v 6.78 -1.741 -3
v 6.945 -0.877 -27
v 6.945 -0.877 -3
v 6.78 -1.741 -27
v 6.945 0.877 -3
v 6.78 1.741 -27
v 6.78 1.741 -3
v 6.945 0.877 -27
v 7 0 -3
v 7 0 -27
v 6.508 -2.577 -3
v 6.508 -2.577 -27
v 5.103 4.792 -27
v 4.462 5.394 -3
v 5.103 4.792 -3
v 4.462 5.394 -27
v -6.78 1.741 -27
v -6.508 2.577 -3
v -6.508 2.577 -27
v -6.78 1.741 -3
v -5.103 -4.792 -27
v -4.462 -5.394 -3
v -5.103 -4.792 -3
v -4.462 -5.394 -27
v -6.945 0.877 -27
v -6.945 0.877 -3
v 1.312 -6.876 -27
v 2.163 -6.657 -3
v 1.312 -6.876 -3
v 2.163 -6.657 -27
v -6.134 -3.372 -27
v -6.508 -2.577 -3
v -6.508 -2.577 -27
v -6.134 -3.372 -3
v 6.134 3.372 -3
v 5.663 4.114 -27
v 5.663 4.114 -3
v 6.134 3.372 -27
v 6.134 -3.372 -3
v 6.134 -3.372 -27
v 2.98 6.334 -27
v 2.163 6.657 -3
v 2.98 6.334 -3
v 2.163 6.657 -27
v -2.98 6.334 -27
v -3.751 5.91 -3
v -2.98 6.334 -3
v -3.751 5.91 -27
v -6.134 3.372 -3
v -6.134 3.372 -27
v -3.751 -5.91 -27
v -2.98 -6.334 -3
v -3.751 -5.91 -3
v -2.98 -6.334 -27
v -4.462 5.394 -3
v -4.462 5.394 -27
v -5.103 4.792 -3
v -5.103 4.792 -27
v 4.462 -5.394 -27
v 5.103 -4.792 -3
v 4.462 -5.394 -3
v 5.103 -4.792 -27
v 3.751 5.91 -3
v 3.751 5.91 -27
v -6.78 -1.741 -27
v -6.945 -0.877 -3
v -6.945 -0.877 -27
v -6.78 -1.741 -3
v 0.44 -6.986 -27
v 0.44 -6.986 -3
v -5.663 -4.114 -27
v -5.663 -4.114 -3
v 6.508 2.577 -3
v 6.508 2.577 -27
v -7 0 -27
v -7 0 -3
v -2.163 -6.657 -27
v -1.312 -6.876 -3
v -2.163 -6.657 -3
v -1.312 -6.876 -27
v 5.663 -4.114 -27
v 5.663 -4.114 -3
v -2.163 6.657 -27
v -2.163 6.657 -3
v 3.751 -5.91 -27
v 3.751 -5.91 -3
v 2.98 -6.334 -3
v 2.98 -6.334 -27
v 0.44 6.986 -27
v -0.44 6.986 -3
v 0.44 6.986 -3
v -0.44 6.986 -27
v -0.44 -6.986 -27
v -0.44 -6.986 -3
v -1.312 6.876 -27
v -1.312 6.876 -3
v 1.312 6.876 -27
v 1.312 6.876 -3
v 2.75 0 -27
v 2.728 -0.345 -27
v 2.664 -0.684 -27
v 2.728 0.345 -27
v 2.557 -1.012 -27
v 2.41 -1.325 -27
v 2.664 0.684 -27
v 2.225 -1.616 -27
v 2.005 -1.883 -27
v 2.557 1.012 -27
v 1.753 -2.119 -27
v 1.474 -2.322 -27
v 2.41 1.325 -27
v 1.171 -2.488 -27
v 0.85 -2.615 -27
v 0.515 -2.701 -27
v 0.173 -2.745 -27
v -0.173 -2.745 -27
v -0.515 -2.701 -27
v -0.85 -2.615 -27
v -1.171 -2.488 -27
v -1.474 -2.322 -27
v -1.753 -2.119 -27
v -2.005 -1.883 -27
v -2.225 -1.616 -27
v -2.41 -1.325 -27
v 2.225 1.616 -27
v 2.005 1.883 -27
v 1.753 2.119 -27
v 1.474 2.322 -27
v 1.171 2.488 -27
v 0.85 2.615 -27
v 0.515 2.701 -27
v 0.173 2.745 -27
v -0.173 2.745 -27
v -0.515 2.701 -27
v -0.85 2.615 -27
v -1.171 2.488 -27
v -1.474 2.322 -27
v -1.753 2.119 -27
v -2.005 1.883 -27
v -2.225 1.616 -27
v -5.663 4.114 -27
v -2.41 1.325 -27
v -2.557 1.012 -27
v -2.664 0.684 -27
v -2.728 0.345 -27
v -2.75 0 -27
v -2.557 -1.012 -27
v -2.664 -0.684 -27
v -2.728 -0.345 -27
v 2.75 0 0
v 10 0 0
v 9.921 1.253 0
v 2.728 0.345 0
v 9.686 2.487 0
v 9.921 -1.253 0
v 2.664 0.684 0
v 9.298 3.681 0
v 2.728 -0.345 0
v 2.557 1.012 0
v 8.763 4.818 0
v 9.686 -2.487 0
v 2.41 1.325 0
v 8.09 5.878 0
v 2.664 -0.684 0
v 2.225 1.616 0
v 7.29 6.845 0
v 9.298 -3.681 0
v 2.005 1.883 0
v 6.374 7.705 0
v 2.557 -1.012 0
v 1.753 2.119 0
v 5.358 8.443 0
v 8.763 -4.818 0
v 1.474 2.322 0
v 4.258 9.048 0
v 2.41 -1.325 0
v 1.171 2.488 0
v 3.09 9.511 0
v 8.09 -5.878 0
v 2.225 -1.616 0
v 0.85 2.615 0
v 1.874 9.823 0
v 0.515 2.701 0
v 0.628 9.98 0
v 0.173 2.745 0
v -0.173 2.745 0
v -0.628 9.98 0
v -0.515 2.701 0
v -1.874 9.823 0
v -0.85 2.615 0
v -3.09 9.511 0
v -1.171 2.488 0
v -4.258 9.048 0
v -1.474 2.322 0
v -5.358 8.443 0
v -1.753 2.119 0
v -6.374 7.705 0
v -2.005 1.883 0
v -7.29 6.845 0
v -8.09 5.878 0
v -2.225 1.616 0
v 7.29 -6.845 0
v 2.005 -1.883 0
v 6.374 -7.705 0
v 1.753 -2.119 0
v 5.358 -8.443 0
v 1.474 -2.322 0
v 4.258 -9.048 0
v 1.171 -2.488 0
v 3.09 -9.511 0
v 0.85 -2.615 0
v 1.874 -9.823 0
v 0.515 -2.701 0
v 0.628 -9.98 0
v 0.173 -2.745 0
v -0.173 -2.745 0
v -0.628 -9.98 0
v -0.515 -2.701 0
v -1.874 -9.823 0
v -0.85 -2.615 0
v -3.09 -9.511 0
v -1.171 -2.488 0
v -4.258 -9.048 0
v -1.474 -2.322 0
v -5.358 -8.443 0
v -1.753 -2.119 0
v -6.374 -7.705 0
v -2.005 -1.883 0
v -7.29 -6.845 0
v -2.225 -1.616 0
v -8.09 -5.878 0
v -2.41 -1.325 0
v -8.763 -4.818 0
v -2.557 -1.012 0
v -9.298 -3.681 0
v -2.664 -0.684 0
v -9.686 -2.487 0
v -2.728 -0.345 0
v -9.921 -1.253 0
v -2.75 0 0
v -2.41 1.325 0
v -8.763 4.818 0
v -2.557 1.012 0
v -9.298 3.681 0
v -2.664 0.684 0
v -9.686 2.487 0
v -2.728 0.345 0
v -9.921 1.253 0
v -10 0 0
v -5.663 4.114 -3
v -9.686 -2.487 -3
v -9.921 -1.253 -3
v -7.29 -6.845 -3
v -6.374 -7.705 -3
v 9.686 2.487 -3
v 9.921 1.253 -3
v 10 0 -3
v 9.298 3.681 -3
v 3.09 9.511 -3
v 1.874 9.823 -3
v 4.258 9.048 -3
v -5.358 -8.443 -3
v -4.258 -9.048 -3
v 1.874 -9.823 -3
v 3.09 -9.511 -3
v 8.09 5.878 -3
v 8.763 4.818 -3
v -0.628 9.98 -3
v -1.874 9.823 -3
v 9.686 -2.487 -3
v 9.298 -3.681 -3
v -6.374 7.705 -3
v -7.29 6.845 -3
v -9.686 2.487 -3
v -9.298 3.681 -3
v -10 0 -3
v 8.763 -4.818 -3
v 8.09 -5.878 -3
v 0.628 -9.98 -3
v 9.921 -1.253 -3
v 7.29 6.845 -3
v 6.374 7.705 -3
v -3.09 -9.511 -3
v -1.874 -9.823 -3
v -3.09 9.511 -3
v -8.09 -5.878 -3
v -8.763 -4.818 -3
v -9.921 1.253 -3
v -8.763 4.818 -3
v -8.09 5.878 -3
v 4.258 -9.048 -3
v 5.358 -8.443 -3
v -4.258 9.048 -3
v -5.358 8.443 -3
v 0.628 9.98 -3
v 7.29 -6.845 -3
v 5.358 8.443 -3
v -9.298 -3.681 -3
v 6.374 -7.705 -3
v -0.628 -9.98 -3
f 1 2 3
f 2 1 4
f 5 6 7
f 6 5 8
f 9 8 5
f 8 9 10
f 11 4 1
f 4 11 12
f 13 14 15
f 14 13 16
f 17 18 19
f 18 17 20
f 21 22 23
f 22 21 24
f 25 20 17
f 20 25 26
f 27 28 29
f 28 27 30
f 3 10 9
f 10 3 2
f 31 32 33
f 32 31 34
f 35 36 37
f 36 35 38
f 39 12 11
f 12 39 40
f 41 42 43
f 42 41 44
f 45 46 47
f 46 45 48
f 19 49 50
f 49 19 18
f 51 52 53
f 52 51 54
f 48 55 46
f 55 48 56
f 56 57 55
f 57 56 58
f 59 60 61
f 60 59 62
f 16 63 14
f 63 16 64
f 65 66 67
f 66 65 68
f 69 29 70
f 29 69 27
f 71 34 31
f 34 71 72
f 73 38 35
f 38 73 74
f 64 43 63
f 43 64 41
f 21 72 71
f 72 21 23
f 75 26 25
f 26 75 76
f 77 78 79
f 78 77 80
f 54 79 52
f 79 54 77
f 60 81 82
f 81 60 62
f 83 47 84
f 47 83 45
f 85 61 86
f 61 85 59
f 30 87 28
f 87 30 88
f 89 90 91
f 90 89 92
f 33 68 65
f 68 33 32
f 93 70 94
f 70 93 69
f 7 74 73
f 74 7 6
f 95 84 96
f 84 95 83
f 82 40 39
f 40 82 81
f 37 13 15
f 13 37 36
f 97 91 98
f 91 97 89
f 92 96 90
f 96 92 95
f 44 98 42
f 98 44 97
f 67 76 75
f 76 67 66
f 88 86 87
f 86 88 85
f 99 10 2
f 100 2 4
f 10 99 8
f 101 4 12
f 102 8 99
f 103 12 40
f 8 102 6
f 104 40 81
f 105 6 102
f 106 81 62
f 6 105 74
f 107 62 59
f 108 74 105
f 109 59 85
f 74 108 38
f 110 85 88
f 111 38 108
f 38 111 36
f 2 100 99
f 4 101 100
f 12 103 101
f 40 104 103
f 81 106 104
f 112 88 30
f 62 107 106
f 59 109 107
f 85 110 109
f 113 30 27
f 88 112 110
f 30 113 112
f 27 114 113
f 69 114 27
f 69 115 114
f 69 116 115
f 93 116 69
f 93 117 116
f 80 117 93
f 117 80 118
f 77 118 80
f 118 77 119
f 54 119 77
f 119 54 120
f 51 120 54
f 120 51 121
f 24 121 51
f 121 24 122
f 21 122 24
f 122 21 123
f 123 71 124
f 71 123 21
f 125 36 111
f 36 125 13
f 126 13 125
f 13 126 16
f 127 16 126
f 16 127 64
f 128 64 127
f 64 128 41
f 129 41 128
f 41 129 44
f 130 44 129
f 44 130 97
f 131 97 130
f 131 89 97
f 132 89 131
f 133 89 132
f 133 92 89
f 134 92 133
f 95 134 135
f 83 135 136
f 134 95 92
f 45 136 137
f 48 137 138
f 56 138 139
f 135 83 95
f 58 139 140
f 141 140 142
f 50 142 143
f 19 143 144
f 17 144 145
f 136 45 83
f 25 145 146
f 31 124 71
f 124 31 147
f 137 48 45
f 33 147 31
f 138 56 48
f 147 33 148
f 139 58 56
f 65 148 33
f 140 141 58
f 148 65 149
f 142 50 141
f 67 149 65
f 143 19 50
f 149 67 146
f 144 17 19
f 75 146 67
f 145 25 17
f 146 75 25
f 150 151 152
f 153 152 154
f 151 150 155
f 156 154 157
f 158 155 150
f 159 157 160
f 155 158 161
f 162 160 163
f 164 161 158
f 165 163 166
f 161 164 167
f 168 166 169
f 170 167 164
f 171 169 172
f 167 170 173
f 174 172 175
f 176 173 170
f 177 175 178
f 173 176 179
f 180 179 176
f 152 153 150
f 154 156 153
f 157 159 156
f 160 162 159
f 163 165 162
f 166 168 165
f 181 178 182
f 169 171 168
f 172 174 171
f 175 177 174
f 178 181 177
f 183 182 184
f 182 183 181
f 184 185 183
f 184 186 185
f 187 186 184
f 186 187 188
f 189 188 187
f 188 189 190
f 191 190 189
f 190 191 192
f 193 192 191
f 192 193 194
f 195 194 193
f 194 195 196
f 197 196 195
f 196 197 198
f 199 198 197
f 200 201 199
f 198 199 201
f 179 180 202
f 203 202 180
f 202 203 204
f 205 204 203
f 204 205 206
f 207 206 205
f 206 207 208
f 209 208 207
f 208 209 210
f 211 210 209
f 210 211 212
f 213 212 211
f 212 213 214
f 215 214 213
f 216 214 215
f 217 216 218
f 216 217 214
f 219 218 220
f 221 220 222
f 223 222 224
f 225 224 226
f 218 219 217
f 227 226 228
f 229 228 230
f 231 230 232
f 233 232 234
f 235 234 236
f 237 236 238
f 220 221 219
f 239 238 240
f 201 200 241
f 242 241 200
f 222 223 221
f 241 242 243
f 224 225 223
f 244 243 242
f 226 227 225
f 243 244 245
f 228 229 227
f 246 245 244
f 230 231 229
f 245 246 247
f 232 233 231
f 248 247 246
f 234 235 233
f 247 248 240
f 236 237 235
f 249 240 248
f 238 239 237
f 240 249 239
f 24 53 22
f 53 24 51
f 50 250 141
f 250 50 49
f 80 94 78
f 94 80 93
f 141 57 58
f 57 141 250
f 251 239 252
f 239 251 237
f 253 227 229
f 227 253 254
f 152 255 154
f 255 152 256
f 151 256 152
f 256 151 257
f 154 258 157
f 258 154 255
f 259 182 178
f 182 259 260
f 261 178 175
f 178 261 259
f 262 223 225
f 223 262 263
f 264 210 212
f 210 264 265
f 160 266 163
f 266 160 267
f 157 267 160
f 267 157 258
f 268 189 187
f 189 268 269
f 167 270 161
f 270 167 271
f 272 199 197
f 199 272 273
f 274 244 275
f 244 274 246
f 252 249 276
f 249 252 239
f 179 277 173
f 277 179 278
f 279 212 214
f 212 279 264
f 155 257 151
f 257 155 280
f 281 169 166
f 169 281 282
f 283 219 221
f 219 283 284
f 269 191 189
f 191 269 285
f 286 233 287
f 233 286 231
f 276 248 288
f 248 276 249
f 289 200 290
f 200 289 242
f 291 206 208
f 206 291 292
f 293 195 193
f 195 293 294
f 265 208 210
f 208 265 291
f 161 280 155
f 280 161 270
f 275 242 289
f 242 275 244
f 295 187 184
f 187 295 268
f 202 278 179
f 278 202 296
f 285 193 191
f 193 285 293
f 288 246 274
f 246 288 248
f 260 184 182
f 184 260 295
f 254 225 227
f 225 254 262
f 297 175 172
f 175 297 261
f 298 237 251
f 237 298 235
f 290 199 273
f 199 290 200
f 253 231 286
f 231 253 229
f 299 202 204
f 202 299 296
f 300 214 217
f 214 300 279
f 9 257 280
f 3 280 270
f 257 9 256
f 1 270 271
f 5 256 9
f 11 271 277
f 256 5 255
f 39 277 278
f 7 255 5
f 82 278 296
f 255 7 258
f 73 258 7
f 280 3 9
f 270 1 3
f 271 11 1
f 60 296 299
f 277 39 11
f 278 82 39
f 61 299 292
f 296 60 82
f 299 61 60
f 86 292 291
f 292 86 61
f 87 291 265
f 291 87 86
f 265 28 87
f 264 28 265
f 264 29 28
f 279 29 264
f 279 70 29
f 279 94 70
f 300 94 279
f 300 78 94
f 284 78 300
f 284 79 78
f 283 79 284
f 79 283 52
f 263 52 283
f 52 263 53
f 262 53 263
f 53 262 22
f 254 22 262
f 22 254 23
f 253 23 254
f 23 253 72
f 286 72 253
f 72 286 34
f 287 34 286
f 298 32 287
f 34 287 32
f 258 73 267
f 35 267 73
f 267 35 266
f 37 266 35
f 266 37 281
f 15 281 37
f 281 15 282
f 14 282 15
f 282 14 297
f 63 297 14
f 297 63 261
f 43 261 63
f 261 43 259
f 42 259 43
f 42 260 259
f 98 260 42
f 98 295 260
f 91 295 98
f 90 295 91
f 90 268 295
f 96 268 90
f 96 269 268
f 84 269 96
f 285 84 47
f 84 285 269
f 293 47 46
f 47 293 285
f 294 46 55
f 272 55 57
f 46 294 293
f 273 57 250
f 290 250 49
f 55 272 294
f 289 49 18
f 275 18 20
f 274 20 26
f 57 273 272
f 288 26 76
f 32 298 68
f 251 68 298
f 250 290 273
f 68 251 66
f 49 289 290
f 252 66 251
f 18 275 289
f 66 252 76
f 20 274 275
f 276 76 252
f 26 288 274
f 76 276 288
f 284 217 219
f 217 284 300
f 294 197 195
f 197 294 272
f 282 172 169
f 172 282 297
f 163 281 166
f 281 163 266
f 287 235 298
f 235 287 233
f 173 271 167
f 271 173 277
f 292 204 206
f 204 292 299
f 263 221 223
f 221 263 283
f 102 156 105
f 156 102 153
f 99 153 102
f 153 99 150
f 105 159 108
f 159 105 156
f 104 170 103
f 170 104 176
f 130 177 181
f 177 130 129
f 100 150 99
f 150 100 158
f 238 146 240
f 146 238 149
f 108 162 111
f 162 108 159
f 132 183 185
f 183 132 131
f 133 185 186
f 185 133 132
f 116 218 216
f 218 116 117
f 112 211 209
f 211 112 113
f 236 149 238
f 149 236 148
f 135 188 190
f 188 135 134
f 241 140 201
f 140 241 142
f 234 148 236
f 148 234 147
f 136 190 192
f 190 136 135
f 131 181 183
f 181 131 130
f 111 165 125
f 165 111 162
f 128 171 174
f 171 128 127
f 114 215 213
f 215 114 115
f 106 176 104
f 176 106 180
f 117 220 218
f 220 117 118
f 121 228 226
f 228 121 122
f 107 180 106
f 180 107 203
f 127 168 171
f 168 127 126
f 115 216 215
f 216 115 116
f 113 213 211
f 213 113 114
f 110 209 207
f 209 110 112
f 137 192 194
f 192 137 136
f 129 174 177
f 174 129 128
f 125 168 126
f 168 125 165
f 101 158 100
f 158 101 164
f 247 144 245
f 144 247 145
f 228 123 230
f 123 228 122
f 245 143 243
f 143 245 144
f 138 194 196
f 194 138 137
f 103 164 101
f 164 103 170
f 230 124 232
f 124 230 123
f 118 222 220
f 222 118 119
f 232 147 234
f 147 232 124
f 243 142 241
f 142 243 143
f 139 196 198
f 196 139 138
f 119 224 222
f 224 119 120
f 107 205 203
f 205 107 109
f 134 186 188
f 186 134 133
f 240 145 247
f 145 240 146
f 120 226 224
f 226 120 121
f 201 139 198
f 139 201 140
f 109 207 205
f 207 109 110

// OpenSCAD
$fn = 50;


difference() {
	union() {
		translate(v = [0, 0, -27.0000000000]) {
			cylinder(h = 27, r = 7.0000000000);
		}
		translate(v = [0, 0, -3.0000000000]) {
			cylinder(h = 3, r = 10.0000000000);
		}
	}
	union() {
		#translate(v = [0, 0, -27]) {
			cylinder(h = 27, r = 2.7500000000);
		}
	}
}
